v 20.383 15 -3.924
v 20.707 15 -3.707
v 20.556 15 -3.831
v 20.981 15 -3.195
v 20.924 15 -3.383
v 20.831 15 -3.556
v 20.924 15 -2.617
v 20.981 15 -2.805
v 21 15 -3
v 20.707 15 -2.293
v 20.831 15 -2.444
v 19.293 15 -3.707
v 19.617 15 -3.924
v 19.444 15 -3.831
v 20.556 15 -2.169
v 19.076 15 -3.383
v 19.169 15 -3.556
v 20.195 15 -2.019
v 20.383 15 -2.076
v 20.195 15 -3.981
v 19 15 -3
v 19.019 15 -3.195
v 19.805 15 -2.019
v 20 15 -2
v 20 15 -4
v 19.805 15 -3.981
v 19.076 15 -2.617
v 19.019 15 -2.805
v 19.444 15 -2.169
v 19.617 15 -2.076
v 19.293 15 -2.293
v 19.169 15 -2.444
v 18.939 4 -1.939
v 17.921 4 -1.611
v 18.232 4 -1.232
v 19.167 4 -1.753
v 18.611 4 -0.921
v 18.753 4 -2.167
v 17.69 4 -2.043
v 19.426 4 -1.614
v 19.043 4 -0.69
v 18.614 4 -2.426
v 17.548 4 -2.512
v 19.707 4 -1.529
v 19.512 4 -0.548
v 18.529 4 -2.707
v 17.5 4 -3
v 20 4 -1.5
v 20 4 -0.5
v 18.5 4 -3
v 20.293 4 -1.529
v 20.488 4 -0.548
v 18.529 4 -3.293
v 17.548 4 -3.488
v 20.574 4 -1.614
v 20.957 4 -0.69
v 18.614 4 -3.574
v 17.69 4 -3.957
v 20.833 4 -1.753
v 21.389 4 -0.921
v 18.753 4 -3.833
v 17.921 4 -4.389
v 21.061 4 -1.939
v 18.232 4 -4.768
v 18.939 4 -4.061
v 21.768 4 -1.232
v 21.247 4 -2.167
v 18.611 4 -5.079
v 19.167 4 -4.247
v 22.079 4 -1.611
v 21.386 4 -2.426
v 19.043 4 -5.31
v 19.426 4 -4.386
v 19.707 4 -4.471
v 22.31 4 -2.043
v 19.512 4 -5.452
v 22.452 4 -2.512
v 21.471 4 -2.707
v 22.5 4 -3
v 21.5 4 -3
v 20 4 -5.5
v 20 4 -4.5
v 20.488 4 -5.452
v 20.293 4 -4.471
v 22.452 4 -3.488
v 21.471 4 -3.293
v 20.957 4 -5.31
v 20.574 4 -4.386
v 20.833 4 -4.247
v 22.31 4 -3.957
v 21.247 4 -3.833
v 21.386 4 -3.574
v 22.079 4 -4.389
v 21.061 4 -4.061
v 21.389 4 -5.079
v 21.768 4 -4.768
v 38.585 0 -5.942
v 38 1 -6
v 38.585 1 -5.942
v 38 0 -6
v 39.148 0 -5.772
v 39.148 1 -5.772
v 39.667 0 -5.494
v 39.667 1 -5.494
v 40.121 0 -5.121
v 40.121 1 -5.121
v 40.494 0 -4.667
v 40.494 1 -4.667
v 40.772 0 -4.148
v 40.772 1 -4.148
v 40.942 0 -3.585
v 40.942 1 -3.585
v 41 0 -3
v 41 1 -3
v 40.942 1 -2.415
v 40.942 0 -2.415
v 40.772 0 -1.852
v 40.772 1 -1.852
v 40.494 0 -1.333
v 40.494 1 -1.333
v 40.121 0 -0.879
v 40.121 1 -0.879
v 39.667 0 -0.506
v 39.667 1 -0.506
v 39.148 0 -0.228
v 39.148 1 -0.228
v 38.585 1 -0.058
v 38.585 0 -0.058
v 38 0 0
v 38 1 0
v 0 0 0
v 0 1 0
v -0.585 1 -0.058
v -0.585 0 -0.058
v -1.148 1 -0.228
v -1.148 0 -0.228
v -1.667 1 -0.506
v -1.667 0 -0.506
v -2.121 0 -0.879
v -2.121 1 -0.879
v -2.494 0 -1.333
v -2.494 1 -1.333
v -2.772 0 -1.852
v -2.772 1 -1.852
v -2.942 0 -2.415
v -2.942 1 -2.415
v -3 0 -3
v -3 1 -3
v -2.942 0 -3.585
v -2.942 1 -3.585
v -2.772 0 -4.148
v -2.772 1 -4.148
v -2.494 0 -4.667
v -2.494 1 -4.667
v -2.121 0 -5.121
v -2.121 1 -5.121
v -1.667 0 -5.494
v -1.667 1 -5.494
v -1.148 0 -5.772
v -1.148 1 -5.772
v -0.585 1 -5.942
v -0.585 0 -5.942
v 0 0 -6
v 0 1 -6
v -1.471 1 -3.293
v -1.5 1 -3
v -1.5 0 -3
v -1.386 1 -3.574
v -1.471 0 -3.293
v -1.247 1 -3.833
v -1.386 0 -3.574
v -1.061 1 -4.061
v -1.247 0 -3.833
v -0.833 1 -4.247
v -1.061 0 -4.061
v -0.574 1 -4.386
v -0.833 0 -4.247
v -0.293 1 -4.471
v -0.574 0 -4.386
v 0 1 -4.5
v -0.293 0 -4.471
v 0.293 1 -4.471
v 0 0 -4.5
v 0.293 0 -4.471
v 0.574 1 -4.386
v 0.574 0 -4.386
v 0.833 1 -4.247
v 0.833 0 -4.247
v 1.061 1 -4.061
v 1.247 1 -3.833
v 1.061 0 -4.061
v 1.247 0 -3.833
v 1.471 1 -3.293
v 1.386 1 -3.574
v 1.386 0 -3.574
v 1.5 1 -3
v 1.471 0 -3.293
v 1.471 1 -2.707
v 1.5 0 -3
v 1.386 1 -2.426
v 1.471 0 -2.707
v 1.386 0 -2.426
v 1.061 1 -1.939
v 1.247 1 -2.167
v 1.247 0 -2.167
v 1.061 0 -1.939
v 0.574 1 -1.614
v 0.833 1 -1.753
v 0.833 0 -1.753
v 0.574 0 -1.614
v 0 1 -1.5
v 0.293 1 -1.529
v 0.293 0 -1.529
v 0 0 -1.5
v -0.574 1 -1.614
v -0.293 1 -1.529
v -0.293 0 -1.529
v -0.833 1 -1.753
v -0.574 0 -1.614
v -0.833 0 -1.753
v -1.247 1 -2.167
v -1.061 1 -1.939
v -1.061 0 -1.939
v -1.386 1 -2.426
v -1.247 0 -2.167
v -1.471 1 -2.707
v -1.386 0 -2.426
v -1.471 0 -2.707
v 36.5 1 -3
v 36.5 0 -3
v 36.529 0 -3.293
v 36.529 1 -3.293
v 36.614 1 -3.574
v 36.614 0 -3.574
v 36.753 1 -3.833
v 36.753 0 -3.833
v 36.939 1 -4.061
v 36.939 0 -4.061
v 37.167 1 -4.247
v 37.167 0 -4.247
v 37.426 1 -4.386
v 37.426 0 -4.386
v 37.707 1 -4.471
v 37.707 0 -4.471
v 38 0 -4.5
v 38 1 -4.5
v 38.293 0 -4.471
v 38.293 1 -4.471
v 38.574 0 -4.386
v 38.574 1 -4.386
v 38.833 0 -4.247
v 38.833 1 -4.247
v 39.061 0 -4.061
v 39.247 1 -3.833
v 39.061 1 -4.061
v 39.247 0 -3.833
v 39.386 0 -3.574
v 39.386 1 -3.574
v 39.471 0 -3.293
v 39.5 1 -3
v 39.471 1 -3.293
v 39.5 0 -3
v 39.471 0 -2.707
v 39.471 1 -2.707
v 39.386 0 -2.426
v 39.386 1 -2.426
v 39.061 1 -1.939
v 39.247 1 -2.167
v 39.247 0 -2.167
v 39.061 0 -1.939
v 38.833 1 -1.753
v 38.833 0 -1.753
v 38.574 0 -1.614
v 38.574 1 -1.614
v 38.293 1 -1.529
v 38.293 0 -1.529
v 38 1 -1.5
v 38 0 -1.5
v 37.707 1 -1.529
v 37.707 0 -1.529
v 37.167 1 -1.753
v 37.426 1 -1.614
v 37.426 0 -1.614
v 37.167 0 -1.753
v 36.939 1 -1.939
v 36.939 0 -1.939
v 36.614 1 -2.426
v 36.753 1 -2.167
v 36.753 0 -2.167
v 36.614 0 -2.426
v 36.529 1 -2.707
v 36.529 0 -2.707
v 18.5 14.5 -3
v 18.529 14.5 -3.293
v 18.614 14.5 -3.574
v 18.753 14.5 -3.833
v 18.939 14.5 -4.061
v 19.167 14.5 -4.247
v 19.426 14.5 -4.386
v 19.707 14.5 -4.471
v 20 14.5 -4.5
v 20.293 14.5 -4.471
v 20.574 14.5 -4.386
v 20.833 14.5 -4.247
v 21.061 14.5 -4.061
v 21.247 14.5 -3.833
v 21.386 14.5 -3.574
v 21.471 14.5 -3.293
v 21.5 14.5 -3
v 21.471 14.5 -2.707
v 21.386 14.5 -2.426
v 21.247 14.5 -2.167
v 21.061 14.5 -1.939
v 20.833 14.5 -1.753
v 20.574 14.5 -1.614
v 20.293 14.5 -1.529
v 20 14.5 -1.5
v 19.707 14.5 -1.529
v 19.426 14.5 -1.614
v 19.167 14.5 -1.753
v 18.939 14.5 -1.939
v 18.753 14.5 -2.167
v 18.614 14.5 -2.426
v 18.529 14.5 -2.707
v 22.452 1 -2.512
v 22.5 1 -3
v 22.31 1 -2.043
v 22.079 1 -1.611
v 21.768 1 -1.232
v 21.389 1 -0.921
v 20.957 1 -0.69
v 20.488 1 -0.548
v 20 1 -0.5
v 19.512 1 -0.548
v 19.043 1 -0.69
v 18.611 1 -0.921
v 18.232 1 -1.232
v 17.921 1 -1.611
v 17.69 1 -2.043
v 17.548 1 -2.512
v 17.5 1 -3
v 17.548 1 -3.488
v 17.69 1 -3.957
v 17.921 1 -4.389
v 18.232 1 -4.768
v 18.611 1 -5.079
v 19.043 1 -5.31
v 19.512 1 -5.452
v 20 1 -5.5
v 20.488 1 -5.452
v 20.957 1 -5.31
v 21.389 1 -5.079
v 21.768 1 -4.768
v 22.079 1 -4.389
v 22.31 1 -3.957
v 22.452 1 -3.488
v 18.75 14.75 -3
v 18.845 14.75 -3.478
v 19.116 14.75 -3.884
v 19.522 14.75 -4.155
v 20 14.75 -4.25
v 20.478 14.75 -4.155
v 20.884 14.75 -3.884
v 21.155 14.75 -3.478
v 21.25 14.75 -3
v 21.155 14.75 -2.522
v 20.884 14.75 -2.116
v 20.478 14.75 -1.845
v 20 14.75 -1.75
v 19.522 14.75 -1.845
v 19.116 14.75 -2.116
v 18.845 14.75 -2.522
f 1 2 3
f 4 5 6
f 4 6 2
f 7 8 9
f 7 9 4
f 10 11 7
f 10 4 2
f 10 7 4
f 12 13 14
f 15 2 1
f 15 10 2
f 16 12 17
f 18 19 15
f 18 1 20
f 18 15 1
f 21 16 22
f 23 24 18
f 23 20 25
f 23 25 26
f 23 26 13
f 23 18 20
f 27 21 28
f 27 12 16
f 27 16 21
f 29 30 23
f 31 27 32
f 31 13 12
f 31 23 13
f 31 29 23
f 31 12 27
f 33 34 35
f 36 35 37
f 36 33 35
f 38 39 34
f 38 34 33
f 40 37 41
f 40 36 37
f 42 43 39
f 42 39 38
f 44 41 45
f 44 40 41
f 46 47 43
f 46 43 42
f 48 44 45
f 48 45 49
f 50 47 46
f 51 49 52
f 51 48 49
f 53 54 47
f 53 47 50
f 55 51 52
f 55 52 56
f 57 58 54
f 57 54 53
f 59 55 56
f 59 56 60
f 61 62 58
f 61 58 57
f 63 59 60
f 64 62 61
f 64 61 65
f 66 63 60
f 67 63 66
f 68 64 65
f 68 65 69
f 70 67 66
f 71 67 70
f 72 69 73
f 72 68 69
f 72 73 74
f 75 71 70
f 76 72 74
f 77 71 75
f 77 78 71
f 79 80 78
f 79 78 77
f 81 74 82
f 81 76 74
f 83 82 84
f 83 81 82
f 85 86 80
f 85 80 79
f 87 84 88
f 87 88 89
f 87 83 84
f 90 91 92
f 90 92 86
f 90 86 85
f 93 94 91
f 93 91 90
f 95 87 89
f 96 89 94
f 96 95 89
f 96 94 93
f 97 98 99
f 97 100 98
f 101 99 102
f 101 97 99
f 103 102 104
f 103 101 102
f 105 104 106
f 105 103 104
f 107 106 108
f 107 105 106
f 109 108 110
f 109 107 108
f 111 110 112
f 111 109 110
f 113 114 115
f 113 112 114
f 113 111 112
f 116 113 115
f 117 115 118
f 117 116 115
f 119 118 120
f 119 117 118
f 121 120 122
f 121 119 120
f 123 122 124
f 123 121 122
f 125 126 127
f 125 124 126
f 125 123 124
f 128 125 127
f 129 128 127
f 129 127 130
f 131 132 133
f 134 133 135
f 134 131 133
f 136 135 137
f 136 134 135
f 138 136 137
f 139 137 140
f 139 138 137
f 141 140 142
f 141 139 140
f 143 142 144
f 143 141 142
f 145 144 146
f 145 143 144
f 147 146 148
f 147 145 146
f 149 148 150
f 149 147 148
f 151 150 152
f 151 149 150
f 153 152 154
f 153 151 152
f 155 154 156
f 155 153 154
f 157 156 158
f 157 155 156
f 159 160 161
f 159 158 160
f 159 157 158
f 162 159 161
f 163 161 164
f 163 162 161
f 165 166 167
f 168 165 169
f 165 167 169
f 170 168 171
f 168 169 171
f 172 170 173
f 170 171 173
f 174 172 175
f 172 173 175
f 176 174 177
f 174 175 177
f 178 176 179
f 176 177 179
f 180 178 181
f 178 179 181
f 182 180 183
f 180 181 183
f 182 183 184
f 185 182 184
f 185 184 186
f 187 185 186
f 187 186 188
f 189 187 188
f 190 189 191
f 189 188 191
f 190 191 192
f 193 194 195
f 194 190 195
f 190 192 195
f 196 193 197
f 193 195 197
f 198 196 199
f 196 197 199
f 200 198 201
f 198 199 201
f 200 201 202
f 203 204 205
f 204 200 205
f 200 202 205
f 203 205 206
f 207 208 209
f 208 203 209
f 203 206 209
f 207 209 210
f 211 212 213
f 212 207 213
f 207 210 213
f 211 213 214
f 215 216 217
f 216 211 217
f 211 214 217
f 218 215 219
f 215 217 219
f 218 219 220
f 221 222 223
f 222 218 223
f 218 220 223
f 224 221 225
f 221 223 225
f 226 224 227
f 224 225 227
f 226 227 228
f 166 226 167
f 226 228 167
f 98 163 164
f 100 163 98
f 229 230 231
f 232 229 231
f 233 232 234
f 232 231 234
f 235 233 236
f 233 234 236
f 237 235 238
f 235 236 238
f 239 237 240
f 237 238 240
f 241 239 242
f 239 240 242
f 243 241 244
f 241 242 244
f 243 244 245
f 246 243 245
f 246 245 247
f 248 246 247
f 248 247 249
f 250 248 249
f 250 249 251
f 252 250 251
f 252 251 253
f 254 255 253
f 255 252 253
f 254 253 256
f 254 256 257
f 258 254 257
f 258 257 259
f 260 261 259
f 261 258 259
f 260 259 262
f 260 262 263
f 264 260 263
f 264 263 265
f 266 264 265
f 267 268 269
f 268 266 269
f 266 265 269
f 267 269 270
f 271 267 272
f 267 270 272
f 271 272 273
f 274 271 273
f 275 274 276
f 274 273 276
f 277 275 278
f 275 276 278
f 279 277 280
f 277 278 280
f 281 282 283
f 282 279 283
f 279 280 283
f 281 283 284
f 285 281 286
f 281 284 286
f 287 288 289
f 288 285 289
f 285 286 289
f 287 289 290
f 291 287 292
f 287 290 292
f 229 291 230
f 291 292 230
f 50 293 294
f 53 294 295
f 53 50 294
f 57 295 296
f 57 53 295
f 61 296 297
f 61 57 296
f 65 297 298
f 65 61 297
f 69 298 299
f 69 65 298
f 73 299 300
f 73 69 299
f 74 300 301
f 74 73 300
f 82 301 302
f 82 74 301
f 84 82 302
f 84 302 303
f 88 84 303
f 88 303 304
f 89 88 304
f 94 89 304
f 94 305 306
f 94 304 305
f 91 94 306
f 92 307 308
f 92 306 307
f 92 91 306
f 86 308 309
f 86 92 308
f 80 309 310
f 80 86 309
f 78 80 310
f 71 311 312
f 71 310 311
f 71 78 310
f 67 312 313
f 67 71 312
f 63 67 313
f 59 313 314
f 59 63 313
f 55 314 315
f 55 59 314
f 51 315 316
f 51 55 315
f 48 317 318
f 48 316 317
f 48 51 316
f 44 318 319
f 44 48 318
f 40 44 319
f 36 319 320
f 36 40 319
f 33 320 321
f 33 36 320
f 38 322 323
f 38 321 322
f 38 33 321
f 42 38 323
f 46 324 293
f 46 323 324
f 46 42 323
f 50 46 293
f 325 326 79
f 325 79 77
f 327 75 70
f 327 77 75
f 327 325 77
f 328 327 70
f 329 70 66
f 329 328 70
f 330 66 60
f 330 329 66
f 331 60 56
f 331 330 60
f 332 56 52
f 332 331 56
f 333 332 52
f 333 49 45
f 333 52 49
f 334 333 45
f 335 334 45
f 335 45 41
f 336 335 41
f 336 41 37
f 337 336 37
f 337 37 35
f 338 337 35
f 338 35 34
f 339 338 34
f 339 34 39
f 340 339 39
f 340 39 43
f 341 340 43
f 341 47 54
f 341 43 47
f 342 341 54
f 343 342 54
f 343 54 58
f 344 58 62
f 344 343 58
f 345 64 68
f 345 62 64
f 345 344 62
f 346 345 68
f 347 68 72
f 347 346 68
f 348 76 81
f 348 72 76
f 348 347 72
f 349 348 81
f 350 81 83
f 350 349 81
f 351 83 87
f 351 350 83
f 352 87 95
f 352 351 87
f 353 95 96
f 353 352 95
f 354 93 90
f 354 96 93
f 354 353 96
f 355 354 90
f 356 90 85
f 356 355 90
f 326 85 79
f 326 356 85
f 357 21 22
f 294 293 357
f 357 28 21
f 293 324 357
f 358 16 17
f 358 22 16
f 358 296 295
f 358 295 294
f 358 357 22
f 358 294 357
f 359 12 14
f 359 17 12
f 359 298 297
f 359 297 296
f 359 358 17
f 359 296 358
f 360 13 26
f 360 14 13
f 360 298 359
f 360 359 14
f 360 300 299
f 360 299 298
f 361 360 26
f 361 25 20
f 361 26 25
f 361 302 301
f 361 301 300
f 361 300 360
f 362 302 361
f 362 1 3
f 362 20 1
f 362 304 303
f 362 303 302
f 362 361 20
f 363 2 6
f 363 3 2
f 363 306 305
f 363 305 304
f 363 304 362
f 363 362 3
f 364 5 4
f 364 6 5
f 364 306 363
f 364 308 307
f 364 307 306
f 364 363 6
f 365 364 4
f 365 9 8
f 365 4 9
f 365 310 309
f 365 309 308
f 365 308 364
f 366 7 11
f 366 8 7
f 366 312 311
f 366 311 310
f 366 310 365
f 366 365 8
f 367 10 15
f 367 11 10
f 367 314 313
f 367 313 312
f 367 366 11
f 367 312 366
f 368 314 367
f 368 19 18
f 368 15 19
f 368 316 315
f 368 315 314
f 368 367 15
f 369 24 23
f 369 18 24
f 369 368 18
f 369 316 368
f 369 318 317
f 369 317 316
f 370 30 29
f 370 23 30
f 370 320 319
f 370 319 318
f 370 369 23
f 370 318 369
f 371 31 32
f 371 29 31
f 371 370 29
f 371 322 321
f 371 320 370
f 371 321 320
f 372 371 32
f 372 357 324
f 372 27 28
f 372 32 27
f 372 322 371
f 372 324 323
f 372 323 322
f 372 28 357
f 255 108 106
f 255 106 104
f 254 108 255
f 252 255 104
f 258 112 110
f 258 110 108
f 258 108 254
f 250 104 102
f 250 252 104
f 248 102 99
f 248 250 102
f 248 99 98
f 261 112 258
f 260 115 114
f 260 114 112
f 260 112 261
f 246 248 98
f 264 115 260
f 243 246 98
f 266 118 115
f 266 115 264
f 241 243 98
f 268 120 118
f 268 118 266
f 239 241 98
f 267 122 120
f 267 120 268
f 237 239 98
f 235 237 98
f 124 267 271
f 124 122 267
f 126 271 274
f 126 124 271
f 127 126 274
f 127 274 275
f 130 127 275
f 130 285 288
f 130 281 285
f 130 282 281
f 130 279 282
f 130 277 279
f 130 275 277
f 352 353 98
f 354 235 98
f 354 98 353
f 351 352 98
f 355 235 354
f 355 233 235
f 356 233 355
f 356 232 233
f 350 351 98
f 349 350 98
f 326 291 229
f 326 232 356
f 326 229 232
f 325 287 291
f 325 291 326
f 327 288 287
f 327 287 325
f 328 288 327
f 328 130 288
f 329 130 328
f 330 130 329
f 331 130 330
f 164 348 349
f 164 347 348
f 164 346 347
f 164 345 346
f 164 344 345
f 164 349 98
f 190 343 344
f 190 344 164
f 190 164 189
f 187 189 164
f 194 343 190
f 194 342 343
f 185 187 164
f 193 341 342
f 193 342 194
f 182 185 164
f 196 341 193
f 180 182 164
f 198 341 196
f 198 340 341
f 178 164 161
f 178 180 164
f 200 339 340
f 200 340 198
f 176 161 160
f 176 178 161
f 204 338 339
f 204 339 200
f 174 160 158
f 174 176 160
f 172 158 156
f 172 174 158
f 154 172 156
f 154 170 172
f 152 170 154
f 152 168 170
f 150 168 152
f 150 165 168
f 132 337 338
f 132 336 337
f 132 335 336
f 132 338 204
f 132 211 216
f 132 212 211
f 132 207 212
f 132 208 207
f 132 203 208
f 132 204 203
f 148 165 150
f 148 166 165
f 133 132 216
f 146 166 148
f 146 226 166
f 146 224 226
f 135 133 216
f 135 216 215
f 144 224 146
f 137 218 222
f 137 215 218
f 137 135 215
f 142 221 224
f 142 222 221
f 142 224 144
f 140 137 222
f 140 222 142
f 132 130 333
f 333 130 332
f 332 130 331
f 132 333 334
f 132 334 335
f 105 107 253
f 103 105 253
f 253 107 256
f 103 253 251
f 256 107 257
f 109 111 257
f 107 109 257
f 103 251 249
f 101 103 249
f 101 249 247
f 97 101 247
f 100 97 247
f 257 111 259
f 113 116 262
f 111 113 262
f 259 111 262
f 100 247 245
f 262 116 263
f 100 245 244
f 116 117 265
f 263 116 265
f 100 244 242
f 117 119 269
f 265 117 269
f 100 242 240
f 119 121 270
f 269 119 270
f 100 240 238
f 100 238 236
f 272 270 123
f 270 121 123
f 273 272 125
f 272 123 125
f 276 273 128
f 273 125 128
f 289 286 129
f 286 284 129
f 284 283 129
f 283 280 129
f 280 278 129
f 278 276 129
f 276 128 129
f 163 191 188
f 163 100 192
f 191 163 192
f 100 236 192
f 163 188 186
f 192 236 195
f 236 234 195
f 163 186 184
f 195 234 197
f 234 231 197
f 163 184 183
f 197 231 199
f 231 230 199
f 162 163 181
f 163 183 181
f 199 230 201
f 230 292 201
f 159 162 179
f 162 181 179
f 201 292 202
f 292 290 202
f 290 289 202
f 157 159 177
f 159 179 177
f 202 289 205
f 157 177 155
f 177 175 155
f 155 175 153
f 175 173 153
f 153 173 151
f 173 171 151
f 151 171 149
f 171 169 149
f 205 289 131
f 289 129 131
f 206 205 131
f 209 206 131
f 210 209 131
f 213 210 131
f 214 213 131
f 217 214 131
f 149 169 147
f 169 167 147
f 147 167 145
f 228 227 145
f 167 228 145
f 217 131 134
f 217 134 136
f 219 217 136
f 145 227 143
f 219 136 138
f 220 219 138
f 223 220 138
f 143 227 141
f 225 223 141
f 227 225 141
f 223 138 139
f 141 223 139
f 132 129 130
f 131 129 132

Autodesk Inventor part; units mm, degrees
ref_plane "YZ Plane" through (0, 0, 0) normal (1, 0, 0) x (0, 1, 0)
ref_plane "XZ Plane" through (0, 0, 0) normal (0, 1, 0) x (-1, 0, 0)
ref_plane "XY Plane" through (0, 0, 0) normal (0, 0, 1) x (1, 0, 0)
sketch "Sketch1" plane through (0, 0, 0) normal (0, 1, 0) x (-1, 0, 0)
  line L0 (0, -6) -> (0, 0)
  circle A0 centre (-20, -3) radius 1.5
  circle A1 centre (-38, -3) radius 1.5
  circle A2 centre (0, -3) radius 1.5
  circle A3 centre (0, -3) radius 3
  circle A4 centre (-38, -3) radius 3
  line L1 (-38, 0) -> (0, 0)
  line L2 (0, -6) -> (-38, -6)
  point P0 (0, -4.5)
  point P1 (0, -1.5)
  dimension "d11" = 3
  dimension "d26" = 3
  dimension "d27" = 3
  dimension "d28" = 6
  dimension "d29" = 6
extrude "Extrusion2" add sketch "Sketch1" along normal blind 15 contours A0
ref_plane "Work Plane1" through (0, 1, 0) normal (0, 1, 0) x (1, 0, 0)
sketch "Sketch2" plane through (0, 1, 0) normal (0, 1, 0) x (1, 0, 0)
  circle A0 centre (20, 3) radius 1.5 projected
  circle A1 centre (20, 3) radius 2.5
  circle A2 centre (20, 3) radius 1.5
  point P0 (0, 0)
  dimension "d14" = 5
extrude "Extrusion3" add sketch "Sketch2" along normal blind 3
chamfer "Chamfer1" distance 0.5 angle 45 1 edges at (21.5, 15, -3)
extrude "Extrusion4" add sketch "Sketch1" along normal blind 1 contours A3 L0 A2 | L2 A4 L1 A3 | L0 A2 A3 | A4
thread "Thread2" size "M3x0.5" class "6g" standard "ANSI Metric M Profile" length 5
properties part number "linkToActuator3"
